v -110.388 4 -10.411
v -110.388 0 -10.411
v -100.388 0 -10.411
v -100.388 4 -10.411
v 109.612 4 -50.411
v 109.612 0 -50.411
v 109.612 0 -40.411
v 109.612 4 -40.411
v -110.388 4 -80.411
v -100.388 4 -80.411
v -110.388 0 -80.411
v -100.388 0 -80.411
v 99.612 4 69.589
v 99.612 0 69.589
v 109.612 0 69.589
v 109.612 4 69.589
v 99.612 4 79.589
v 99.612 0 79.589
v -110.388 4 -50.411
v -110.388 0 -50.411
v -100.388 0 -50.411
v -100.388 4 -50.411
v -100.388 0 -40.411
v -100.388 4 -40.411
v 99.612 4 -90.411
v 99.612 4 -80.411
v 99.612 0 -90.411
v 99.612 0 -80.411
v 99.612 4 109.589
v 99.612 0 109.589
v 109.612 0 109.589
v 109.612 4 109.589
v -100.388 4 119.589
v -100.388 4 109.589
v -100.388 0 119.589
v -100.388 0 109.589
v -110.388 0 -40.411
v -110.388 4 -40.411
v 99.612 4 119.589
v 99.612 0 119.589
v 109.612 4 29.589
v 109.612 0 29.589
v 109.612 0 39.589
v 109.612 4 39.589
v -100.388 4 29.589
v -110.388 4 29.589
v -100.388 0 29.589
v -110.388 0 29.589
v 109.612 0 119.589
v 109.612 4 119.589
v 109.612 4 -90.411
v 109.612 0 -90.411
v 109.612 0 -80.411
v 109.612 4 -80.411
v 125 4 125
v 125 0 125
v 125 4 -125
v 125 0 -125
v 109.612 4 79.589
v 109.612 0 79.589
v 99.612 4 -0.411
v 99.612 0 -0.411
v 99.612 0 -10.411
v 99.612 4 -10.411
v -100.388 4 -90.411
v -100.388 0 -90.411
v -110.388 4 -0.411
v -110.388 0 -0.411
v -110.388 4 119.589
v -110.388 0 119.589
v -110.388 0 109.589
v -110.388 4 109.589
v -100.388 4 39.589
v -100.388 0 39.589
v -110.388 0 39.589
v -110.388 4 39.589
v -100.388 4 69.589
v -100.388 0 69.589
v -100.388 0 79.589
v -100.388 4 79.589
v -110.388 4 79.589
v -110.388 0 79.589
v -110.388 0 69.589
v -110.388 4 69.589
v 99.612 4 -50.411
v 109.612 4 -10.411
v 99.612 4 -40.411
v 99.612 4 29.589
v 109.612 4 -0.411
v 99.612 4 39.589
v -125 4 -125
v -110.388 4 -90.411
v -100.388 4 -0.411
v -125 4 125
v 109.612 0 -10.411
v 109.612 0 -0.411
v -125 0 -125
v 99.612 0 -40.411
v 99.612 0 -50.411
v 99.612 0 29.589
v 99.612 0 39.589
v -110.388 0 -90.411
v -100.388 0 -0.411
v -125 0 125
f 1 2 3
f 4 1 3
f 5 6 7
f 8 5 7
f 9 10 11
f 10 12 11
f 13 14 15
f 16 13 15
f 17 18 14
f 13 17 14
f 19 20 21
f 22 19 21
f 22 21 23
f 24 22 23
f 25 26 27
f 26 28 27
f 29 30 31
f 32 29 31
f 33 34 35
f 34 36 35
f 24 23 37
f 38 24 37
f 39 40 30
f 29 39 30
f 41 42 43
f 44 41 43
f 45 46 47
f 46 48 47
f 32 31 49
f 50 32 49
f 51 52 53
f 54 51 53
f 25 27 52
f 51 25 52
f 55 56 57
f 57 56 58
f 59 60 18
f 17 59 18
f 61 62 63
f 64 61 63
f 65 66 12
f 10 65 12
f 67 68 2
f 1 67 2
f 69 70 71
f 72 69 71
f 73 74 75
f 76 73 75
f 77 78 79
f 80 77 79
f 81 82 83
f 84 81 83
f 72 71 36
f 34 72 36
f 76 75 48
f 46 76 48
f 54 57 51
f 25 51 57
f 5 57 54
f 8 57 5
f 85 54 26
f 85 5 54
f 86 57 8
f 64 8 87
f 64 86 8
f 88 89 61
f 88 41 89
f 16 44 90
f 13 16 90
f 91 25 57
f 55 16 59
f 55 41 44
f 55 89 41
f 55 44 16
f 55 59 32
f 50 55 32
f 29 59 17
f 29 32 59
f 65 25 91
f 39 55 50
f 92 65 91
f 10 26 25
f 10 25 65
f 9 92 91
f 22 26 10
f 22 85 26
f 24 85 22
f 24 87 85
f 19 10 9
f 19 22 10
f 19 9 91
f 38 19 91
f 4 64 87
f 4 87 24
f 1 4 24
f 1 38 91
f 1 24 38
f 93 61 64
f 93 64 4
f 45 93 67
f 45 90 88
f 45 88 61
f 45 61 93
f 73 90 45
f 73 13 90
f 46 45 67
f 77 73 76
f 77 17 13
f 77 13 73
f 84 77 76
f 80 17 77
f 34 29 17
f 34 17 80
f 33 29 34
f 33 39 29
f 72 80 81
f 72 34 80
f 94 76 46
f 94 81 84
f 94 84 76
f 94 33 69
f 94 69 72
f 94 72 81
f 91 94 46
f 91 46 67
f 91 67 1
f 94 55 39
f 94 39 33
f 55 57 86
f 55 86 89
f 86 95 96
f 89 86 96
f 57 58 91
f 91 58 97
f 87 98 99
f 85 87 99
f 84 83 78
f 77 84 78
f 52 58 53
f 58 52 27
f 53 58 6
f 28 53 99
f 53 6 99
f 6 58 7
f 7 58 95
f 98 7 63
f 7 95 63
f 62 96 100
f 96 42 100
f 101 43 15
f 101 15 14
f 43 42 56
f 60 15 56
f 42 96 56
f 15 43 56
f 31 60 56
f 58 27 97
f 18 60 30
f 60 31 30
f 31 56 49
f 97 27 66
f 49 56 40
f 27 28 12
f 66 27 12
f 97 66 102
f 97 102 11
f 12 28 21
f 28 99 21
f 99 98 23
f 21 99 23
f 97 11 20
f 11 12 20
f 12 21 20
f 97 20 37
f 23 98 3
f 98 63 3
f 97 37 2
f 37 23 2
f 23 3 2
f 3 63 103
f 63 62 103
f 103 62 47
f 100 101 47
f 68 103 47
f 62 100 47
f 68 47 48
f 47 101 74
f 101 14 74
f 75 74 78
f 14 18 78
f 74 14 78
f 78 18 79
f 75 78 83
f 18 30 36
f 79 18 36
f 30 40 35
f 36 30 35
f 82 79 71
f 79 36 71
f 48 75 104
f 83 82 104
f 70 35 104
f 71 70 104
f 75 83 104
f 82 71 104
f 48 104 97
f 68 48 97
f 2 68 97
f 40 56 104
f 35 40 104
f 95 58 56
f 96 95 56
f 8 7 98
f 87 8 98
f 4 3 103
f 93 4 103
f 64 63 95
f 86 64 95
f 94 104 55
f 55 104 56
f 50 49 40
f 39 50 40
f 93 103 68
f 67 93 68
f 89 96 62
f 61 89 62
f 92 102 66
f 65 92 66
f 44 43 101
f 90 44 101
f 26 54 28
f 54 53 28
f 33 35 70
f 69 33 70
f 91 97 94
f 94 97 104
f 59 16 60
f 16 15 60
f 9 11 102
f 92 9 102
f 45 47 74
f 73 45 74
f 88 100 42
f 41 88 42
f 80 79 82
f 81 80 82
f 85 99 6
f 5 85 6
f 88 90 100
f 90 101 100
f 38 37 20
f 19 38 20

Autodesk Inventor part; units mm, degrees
ref_plane "YZ Plane" through (0, 0, 0) normal (1, 0, 0) x (0, 1, 0)
ref_plane "XZ Plane" through (0, 0, 0) normal (0, 1, 0) x (-1, 0, 0)
ref_plane "XY Plane" through (0, 0, 0) normal (0, 0, 1) x (1, 0, 0)
sketch "Эскиз1" plane through (0, 0, 0) normal (0, 1, 0) x (-1, 0, 0)
  line L0 (125, 125) -> (-125, 125)
  line L1 (-125, 125) -> (-125, -125)
  line L2 (-125, -125) -> (125, -125)
  line L3 (125, -125) -> (125, 125)
  line L4 (125, 125) -> (-125, -125) construction
  line L5 (-125, 125) -> (125, -125) construction
  point P0 (0, 0)
  dimension "d0" = 250
  dimension "d1" = 250
extrude "Выдавливание1" add sketch "Эскиз1" along normal blind 4
sketch "Эскиз2" plane through (0, 0, 0) normal (0, -1, 0) x (1, 0, 0)
  line L0 (-110.387511, 109.588885) -> (-110.387511, 119.588885)
  line L1 (-100.387511, 109.588885) -> (-110.387511, 109.588885)
  line L2 (-100.387511, 119.588885) -> (-100.387511, 109.588885)
  line L3 (-110.387511, 119.588885) -> (-100.387511, 119.588885)
  line L4 (-110.387511, 29.588885) -> (-110.387511, 39.588885)
  line L5 (-100.387511, 29.588885) -> (-110.387511, 29.588885)
  line L6 (-100.387511, 39.588885) -> (-100.387511, 29.588885)
  line L7 (-110.387511, 39.588885) -> (-100.387511, 39.588885)
  line L8 (-110.387511, -10.411115) -> (-110.387511, -0.411115)
  line L9 (-100.387511, -10.411115) -> (-110.387511, -10.411115)
  line L10 (-100.387511, -0.411115) -> (-100.387511, -10.411115)
  line L11 (-110.387511, -0.411115) -> (-100.387511, -0.411115)
  line L12 (125, 125) -> (125, -125)
  line L13 (-125, 125) -> (125, 125)
  line L14 (-125, -125) -> (-125, 125)
  line L15 (125, -125) -> (-125, -125)
  line L16 (109.612489, 109.588885) -> (109.612489, 119.588885)
  line L17 (109.612489, 119.588885) -> (99.612489, 119.588885)
  line L18 (99.612489, 119.588885) -> (99.612489, 109.588885)
  line L19 (99.612489, 109.588885) -> (109.612489, 109.588885)
  line L20 (109.612489, 29.588885) -> (109.612489, 39.588885)
  line L21 (109.612489, 39.588885) -> (99.612489, 39.588885)
  line L22 (99.612489, 39.588885) -> (99.612489, 29.588885)
  line L23 (99.612489, 29.588885) -> (109.612489, 29.588885)
  line L24 (109.612489, -10.411115) -> (109.612489, -0.411115)
  line L25 (109.612489, -0.411115) -> (99.612489, -0.411115)
  line L26 (99.612489, -0.411115) -> (99.612489, -10.411115)
  line L27 (99.612489, -10.411115) -> (109.612489, -10.411115)
  line L28 (109.612488, -50.411115) -> (109.612488, -40.411115)
  line L29 (109.612488, -40.411115) -> (99.612488, -40.411115)
  line L30 (99.612488, -40.411115) -> (99.612488, -50.411115)
  line L31 (99.612488, -50.411115) -> (109.612488, -50.411115)
  line L32 (109.612488, -90.411115) -> (109.612488, -80.411115)
  line L33 (109.612488, -80.411115) -> (99.612488, -80.411115)
  line L34 (99.612488, -80.411115) -> (99.612488, -90.411115)
  line L35 (99.612488, -90.411115) -> (109.612488, -90.411115)
  line L36 (-100.387512, -80.411115) -> (-100.387512, -90.411115)
  line L37 (-110.387512, -81.025031) -> (-100.387512, -81.025031)
  line L38 (-110.387512, -90.411115) -> (-110.387512, -80.411115)
  line L39 (-100.387512, -110) -> (-110.387512, -110)
  line L40 (-100.387512, -40.411115) -> (-100.387512, -50.411115)
  line L41 (-100.387512, -50.411115) -> (-110.387512, -50.411115)
  line L42 (-110.387512, -50.411115) -> (-110.387512, -40.411115)
  line L43 (-110.387512, -40.411115) -> (-100.387512, -40.411115)
  line L44 (-100.387512, 74.588885) -> (-100.387512, 69.588885)
  line L45 (-100.387512, 79.588885) -> (-100.387512, 74.588885)
  line L46 (-110.387512, 79.588885) -> (-100.387512, 79.588885)
  line L47 (-110.387512, 74.588885) -> (-110.387512, 79.588885)
  line L48 (-110.387512, 69.588885) -> (-110.387512, 74.588885)
  line L49 (-100.387512, 69.588885) -> (-110.387512, 69.588885)
  line L50 (109.612488, 79.588885) -> (99.612488, 79.588885)
  line L51 (99.612488, 69.588885) -> (109.612488, 69.588885)
  line L52 (99.612488, 74.588885) -> (99.612488, 69.588885)
  line L53 (109.612488, 69.588885) -> (109.612488, 74.588885)
  line L54 (109.612488, 74.588885) -> (109.612488, 79.588885)
  line L55 (99.612488, 79.588885) -> (99.612488, 74.588885)
  circle A0 centre (104.612488, -65.411115) radius 2
  circle A1 centre (104.612488, -25.411115) radius 2
  circle A2 centre (104.612488, 14.588885) radius 2
  circle A3 centre (104.612488, 54.588885) radius 2
  circle A4 centre (104.612488, 94.588885) radius 2
  circle A5 centre (-105.387512, 94.588885) radius 2
  circle A6 centre (-105.387512, 54.588885) radius 2
  circle A7 centre (-105.387512, 14.588885) radius 2
  circle A8 centre (-105.387512, -25.411115) radius 2
  circle A9 centre (-105.387512, -65.411115) radius 2
  point P0 (0, 0)
sketch "Эскиз2 outline for Выдавливание2" plane through (0, 0, 0) normal (0, -1, 0) x (1, 0, 0)
  line L0 (-110.387511, -10.411115) -> (-100.387511, -10.411115)
  line L1 (-110.387511, -0.411115) -> (-110.387511, -10.411115)
  line L2 (-100.387511, -0.411115) -> (-110.387511, -0.411115)
  line L3 (-100.387511, -10.411115) -> (-100.387511, -0.411115)
  line L4 (-110.387511, 29.588885) -> (-100.387511, 29.588885)
  line L5 (-110.387511, 39.588885) -> (-110.387511, 29.588885)
  line L6 (-100.387511, 39.588885) -> (-110.387511, 39.588885)
  line L7 (-100.387511, 29.588885) -> (-100.387511, 39.588885)
  line L8 (-110.387511, 109.588885) -> (-100.387511, 109.588885)
  line L9 (-110.387511, 119.588885) -> (-110.387511, 109.588885)
  line L10 (-100.387511, 119.588885) -> (-110.387511, 119.588885)
  line L11 (-100.387511, 109.588885) -> (-100.387511, 119.588885)
  line L12 (109.612488, -90.411115) -> (109.612488, -80.411115)
  line L13 (99.612488, -90.411115) -> (109.612488, -90.411115)
  line L14 (99.612488, -80.411115) -> (99.612488, -90.411115)
  line L15 (109.612488, -80.411115) -> (99.612488, -80.411115)
  line L16 (109.612488, -50.411115) -> (109.612488, -40.411115)
  line L17 (99.612488, -50.411115) -> (109.612488, -50.411115)
  line L18 (99.612488, -40.411115) -> (99.612488, -50.411115)
  line L19 (109.612488, -40.411115) -> (99.612488, -40.411115)
  line L20 (109.612489, -10.411115) -> (109.612489, -0.411115)
  line L21 (99.612489, -10.411115) -> (109.612489, -10.411115)
  line L22 (99.612489, -0.411115) -> (99.612489, -10.411115)
  line L23 (109.612489, -0.411115) -> (99.612489, -0.411115)
  line L24 (109.612489, 29.588885) -> (109.612489, 39.588885)
  line L25 (99.612489, 29.588885) -> (109.612489, 29.588885)
  line L26 (99.612489, 39.588885) -> (99.612489, 29.588885)
  line L27 (109.612489, 39.588885) -> (99.612489, 39.588885)
  line L28 (109.612489, 109.588885) -> (109.612489, 119.588885)
  line L29 (99.612489, 109.588885) -> (109.612489, 109.588885)
  line L30 (99.612489, 119.588885) -> (99.612489, 109.588885)
  line L31 (109.612489, 119.588885) -> (99.612489, 119.588885)
  line L32 (-100.387512, -80.411115) -> (-110.387512, -80.411115)
  line L33 (-100.387512, -90.411115) -> (-100.387512, -80.411115)
  line L34 (-110.387512, -90.411115) -> (-100.387512, -90.411115)
  line L35 (-110.387512, -80.411115) -> (-110.387512, -90.411115)
  line L36 (-100.387512, -40.411115) -> (-110.387512, -40.411115)
  line L37 (-100.387512, -50.411115) -> (-100.387512, -40.411115)
  line L38 (-110.387512, -50.411115) -> (-100.387512, -50.411115)
  line L39 (-110.387512, -40.411115) -> (-110.387512, -50.411115)
  line L40 (-100.387512, 69.588885) -> (-100.387512, 79.588885)
  line L41 (-100.387512, 79.588885) -> (-110.387512, 79.588885)
  line L42 (-110.387512, 79.588885) -> (-110.387512, 69.588885)
  line L43 (-110.387512, 69.588885) -> (-100.387512, 69.588885)
  line L44 (109.612488, 79.588885) -> (99.612488, 79.588885)
  line L45 (99.612488, 79.588885) -> (99.612488, 69.588885)
  line L46 (99.612488, 69.588885) -> (109.612488, 69.588885)
  line L47 (109.612488, 69.588885) -> (109.612488, 79.588885)
extrude "Выдавливание2" cut sketch "Эскиз2 outline for Выдавливание2" against normal up to surface (4 mm away)
properties part number "Платформа подъёмника"
